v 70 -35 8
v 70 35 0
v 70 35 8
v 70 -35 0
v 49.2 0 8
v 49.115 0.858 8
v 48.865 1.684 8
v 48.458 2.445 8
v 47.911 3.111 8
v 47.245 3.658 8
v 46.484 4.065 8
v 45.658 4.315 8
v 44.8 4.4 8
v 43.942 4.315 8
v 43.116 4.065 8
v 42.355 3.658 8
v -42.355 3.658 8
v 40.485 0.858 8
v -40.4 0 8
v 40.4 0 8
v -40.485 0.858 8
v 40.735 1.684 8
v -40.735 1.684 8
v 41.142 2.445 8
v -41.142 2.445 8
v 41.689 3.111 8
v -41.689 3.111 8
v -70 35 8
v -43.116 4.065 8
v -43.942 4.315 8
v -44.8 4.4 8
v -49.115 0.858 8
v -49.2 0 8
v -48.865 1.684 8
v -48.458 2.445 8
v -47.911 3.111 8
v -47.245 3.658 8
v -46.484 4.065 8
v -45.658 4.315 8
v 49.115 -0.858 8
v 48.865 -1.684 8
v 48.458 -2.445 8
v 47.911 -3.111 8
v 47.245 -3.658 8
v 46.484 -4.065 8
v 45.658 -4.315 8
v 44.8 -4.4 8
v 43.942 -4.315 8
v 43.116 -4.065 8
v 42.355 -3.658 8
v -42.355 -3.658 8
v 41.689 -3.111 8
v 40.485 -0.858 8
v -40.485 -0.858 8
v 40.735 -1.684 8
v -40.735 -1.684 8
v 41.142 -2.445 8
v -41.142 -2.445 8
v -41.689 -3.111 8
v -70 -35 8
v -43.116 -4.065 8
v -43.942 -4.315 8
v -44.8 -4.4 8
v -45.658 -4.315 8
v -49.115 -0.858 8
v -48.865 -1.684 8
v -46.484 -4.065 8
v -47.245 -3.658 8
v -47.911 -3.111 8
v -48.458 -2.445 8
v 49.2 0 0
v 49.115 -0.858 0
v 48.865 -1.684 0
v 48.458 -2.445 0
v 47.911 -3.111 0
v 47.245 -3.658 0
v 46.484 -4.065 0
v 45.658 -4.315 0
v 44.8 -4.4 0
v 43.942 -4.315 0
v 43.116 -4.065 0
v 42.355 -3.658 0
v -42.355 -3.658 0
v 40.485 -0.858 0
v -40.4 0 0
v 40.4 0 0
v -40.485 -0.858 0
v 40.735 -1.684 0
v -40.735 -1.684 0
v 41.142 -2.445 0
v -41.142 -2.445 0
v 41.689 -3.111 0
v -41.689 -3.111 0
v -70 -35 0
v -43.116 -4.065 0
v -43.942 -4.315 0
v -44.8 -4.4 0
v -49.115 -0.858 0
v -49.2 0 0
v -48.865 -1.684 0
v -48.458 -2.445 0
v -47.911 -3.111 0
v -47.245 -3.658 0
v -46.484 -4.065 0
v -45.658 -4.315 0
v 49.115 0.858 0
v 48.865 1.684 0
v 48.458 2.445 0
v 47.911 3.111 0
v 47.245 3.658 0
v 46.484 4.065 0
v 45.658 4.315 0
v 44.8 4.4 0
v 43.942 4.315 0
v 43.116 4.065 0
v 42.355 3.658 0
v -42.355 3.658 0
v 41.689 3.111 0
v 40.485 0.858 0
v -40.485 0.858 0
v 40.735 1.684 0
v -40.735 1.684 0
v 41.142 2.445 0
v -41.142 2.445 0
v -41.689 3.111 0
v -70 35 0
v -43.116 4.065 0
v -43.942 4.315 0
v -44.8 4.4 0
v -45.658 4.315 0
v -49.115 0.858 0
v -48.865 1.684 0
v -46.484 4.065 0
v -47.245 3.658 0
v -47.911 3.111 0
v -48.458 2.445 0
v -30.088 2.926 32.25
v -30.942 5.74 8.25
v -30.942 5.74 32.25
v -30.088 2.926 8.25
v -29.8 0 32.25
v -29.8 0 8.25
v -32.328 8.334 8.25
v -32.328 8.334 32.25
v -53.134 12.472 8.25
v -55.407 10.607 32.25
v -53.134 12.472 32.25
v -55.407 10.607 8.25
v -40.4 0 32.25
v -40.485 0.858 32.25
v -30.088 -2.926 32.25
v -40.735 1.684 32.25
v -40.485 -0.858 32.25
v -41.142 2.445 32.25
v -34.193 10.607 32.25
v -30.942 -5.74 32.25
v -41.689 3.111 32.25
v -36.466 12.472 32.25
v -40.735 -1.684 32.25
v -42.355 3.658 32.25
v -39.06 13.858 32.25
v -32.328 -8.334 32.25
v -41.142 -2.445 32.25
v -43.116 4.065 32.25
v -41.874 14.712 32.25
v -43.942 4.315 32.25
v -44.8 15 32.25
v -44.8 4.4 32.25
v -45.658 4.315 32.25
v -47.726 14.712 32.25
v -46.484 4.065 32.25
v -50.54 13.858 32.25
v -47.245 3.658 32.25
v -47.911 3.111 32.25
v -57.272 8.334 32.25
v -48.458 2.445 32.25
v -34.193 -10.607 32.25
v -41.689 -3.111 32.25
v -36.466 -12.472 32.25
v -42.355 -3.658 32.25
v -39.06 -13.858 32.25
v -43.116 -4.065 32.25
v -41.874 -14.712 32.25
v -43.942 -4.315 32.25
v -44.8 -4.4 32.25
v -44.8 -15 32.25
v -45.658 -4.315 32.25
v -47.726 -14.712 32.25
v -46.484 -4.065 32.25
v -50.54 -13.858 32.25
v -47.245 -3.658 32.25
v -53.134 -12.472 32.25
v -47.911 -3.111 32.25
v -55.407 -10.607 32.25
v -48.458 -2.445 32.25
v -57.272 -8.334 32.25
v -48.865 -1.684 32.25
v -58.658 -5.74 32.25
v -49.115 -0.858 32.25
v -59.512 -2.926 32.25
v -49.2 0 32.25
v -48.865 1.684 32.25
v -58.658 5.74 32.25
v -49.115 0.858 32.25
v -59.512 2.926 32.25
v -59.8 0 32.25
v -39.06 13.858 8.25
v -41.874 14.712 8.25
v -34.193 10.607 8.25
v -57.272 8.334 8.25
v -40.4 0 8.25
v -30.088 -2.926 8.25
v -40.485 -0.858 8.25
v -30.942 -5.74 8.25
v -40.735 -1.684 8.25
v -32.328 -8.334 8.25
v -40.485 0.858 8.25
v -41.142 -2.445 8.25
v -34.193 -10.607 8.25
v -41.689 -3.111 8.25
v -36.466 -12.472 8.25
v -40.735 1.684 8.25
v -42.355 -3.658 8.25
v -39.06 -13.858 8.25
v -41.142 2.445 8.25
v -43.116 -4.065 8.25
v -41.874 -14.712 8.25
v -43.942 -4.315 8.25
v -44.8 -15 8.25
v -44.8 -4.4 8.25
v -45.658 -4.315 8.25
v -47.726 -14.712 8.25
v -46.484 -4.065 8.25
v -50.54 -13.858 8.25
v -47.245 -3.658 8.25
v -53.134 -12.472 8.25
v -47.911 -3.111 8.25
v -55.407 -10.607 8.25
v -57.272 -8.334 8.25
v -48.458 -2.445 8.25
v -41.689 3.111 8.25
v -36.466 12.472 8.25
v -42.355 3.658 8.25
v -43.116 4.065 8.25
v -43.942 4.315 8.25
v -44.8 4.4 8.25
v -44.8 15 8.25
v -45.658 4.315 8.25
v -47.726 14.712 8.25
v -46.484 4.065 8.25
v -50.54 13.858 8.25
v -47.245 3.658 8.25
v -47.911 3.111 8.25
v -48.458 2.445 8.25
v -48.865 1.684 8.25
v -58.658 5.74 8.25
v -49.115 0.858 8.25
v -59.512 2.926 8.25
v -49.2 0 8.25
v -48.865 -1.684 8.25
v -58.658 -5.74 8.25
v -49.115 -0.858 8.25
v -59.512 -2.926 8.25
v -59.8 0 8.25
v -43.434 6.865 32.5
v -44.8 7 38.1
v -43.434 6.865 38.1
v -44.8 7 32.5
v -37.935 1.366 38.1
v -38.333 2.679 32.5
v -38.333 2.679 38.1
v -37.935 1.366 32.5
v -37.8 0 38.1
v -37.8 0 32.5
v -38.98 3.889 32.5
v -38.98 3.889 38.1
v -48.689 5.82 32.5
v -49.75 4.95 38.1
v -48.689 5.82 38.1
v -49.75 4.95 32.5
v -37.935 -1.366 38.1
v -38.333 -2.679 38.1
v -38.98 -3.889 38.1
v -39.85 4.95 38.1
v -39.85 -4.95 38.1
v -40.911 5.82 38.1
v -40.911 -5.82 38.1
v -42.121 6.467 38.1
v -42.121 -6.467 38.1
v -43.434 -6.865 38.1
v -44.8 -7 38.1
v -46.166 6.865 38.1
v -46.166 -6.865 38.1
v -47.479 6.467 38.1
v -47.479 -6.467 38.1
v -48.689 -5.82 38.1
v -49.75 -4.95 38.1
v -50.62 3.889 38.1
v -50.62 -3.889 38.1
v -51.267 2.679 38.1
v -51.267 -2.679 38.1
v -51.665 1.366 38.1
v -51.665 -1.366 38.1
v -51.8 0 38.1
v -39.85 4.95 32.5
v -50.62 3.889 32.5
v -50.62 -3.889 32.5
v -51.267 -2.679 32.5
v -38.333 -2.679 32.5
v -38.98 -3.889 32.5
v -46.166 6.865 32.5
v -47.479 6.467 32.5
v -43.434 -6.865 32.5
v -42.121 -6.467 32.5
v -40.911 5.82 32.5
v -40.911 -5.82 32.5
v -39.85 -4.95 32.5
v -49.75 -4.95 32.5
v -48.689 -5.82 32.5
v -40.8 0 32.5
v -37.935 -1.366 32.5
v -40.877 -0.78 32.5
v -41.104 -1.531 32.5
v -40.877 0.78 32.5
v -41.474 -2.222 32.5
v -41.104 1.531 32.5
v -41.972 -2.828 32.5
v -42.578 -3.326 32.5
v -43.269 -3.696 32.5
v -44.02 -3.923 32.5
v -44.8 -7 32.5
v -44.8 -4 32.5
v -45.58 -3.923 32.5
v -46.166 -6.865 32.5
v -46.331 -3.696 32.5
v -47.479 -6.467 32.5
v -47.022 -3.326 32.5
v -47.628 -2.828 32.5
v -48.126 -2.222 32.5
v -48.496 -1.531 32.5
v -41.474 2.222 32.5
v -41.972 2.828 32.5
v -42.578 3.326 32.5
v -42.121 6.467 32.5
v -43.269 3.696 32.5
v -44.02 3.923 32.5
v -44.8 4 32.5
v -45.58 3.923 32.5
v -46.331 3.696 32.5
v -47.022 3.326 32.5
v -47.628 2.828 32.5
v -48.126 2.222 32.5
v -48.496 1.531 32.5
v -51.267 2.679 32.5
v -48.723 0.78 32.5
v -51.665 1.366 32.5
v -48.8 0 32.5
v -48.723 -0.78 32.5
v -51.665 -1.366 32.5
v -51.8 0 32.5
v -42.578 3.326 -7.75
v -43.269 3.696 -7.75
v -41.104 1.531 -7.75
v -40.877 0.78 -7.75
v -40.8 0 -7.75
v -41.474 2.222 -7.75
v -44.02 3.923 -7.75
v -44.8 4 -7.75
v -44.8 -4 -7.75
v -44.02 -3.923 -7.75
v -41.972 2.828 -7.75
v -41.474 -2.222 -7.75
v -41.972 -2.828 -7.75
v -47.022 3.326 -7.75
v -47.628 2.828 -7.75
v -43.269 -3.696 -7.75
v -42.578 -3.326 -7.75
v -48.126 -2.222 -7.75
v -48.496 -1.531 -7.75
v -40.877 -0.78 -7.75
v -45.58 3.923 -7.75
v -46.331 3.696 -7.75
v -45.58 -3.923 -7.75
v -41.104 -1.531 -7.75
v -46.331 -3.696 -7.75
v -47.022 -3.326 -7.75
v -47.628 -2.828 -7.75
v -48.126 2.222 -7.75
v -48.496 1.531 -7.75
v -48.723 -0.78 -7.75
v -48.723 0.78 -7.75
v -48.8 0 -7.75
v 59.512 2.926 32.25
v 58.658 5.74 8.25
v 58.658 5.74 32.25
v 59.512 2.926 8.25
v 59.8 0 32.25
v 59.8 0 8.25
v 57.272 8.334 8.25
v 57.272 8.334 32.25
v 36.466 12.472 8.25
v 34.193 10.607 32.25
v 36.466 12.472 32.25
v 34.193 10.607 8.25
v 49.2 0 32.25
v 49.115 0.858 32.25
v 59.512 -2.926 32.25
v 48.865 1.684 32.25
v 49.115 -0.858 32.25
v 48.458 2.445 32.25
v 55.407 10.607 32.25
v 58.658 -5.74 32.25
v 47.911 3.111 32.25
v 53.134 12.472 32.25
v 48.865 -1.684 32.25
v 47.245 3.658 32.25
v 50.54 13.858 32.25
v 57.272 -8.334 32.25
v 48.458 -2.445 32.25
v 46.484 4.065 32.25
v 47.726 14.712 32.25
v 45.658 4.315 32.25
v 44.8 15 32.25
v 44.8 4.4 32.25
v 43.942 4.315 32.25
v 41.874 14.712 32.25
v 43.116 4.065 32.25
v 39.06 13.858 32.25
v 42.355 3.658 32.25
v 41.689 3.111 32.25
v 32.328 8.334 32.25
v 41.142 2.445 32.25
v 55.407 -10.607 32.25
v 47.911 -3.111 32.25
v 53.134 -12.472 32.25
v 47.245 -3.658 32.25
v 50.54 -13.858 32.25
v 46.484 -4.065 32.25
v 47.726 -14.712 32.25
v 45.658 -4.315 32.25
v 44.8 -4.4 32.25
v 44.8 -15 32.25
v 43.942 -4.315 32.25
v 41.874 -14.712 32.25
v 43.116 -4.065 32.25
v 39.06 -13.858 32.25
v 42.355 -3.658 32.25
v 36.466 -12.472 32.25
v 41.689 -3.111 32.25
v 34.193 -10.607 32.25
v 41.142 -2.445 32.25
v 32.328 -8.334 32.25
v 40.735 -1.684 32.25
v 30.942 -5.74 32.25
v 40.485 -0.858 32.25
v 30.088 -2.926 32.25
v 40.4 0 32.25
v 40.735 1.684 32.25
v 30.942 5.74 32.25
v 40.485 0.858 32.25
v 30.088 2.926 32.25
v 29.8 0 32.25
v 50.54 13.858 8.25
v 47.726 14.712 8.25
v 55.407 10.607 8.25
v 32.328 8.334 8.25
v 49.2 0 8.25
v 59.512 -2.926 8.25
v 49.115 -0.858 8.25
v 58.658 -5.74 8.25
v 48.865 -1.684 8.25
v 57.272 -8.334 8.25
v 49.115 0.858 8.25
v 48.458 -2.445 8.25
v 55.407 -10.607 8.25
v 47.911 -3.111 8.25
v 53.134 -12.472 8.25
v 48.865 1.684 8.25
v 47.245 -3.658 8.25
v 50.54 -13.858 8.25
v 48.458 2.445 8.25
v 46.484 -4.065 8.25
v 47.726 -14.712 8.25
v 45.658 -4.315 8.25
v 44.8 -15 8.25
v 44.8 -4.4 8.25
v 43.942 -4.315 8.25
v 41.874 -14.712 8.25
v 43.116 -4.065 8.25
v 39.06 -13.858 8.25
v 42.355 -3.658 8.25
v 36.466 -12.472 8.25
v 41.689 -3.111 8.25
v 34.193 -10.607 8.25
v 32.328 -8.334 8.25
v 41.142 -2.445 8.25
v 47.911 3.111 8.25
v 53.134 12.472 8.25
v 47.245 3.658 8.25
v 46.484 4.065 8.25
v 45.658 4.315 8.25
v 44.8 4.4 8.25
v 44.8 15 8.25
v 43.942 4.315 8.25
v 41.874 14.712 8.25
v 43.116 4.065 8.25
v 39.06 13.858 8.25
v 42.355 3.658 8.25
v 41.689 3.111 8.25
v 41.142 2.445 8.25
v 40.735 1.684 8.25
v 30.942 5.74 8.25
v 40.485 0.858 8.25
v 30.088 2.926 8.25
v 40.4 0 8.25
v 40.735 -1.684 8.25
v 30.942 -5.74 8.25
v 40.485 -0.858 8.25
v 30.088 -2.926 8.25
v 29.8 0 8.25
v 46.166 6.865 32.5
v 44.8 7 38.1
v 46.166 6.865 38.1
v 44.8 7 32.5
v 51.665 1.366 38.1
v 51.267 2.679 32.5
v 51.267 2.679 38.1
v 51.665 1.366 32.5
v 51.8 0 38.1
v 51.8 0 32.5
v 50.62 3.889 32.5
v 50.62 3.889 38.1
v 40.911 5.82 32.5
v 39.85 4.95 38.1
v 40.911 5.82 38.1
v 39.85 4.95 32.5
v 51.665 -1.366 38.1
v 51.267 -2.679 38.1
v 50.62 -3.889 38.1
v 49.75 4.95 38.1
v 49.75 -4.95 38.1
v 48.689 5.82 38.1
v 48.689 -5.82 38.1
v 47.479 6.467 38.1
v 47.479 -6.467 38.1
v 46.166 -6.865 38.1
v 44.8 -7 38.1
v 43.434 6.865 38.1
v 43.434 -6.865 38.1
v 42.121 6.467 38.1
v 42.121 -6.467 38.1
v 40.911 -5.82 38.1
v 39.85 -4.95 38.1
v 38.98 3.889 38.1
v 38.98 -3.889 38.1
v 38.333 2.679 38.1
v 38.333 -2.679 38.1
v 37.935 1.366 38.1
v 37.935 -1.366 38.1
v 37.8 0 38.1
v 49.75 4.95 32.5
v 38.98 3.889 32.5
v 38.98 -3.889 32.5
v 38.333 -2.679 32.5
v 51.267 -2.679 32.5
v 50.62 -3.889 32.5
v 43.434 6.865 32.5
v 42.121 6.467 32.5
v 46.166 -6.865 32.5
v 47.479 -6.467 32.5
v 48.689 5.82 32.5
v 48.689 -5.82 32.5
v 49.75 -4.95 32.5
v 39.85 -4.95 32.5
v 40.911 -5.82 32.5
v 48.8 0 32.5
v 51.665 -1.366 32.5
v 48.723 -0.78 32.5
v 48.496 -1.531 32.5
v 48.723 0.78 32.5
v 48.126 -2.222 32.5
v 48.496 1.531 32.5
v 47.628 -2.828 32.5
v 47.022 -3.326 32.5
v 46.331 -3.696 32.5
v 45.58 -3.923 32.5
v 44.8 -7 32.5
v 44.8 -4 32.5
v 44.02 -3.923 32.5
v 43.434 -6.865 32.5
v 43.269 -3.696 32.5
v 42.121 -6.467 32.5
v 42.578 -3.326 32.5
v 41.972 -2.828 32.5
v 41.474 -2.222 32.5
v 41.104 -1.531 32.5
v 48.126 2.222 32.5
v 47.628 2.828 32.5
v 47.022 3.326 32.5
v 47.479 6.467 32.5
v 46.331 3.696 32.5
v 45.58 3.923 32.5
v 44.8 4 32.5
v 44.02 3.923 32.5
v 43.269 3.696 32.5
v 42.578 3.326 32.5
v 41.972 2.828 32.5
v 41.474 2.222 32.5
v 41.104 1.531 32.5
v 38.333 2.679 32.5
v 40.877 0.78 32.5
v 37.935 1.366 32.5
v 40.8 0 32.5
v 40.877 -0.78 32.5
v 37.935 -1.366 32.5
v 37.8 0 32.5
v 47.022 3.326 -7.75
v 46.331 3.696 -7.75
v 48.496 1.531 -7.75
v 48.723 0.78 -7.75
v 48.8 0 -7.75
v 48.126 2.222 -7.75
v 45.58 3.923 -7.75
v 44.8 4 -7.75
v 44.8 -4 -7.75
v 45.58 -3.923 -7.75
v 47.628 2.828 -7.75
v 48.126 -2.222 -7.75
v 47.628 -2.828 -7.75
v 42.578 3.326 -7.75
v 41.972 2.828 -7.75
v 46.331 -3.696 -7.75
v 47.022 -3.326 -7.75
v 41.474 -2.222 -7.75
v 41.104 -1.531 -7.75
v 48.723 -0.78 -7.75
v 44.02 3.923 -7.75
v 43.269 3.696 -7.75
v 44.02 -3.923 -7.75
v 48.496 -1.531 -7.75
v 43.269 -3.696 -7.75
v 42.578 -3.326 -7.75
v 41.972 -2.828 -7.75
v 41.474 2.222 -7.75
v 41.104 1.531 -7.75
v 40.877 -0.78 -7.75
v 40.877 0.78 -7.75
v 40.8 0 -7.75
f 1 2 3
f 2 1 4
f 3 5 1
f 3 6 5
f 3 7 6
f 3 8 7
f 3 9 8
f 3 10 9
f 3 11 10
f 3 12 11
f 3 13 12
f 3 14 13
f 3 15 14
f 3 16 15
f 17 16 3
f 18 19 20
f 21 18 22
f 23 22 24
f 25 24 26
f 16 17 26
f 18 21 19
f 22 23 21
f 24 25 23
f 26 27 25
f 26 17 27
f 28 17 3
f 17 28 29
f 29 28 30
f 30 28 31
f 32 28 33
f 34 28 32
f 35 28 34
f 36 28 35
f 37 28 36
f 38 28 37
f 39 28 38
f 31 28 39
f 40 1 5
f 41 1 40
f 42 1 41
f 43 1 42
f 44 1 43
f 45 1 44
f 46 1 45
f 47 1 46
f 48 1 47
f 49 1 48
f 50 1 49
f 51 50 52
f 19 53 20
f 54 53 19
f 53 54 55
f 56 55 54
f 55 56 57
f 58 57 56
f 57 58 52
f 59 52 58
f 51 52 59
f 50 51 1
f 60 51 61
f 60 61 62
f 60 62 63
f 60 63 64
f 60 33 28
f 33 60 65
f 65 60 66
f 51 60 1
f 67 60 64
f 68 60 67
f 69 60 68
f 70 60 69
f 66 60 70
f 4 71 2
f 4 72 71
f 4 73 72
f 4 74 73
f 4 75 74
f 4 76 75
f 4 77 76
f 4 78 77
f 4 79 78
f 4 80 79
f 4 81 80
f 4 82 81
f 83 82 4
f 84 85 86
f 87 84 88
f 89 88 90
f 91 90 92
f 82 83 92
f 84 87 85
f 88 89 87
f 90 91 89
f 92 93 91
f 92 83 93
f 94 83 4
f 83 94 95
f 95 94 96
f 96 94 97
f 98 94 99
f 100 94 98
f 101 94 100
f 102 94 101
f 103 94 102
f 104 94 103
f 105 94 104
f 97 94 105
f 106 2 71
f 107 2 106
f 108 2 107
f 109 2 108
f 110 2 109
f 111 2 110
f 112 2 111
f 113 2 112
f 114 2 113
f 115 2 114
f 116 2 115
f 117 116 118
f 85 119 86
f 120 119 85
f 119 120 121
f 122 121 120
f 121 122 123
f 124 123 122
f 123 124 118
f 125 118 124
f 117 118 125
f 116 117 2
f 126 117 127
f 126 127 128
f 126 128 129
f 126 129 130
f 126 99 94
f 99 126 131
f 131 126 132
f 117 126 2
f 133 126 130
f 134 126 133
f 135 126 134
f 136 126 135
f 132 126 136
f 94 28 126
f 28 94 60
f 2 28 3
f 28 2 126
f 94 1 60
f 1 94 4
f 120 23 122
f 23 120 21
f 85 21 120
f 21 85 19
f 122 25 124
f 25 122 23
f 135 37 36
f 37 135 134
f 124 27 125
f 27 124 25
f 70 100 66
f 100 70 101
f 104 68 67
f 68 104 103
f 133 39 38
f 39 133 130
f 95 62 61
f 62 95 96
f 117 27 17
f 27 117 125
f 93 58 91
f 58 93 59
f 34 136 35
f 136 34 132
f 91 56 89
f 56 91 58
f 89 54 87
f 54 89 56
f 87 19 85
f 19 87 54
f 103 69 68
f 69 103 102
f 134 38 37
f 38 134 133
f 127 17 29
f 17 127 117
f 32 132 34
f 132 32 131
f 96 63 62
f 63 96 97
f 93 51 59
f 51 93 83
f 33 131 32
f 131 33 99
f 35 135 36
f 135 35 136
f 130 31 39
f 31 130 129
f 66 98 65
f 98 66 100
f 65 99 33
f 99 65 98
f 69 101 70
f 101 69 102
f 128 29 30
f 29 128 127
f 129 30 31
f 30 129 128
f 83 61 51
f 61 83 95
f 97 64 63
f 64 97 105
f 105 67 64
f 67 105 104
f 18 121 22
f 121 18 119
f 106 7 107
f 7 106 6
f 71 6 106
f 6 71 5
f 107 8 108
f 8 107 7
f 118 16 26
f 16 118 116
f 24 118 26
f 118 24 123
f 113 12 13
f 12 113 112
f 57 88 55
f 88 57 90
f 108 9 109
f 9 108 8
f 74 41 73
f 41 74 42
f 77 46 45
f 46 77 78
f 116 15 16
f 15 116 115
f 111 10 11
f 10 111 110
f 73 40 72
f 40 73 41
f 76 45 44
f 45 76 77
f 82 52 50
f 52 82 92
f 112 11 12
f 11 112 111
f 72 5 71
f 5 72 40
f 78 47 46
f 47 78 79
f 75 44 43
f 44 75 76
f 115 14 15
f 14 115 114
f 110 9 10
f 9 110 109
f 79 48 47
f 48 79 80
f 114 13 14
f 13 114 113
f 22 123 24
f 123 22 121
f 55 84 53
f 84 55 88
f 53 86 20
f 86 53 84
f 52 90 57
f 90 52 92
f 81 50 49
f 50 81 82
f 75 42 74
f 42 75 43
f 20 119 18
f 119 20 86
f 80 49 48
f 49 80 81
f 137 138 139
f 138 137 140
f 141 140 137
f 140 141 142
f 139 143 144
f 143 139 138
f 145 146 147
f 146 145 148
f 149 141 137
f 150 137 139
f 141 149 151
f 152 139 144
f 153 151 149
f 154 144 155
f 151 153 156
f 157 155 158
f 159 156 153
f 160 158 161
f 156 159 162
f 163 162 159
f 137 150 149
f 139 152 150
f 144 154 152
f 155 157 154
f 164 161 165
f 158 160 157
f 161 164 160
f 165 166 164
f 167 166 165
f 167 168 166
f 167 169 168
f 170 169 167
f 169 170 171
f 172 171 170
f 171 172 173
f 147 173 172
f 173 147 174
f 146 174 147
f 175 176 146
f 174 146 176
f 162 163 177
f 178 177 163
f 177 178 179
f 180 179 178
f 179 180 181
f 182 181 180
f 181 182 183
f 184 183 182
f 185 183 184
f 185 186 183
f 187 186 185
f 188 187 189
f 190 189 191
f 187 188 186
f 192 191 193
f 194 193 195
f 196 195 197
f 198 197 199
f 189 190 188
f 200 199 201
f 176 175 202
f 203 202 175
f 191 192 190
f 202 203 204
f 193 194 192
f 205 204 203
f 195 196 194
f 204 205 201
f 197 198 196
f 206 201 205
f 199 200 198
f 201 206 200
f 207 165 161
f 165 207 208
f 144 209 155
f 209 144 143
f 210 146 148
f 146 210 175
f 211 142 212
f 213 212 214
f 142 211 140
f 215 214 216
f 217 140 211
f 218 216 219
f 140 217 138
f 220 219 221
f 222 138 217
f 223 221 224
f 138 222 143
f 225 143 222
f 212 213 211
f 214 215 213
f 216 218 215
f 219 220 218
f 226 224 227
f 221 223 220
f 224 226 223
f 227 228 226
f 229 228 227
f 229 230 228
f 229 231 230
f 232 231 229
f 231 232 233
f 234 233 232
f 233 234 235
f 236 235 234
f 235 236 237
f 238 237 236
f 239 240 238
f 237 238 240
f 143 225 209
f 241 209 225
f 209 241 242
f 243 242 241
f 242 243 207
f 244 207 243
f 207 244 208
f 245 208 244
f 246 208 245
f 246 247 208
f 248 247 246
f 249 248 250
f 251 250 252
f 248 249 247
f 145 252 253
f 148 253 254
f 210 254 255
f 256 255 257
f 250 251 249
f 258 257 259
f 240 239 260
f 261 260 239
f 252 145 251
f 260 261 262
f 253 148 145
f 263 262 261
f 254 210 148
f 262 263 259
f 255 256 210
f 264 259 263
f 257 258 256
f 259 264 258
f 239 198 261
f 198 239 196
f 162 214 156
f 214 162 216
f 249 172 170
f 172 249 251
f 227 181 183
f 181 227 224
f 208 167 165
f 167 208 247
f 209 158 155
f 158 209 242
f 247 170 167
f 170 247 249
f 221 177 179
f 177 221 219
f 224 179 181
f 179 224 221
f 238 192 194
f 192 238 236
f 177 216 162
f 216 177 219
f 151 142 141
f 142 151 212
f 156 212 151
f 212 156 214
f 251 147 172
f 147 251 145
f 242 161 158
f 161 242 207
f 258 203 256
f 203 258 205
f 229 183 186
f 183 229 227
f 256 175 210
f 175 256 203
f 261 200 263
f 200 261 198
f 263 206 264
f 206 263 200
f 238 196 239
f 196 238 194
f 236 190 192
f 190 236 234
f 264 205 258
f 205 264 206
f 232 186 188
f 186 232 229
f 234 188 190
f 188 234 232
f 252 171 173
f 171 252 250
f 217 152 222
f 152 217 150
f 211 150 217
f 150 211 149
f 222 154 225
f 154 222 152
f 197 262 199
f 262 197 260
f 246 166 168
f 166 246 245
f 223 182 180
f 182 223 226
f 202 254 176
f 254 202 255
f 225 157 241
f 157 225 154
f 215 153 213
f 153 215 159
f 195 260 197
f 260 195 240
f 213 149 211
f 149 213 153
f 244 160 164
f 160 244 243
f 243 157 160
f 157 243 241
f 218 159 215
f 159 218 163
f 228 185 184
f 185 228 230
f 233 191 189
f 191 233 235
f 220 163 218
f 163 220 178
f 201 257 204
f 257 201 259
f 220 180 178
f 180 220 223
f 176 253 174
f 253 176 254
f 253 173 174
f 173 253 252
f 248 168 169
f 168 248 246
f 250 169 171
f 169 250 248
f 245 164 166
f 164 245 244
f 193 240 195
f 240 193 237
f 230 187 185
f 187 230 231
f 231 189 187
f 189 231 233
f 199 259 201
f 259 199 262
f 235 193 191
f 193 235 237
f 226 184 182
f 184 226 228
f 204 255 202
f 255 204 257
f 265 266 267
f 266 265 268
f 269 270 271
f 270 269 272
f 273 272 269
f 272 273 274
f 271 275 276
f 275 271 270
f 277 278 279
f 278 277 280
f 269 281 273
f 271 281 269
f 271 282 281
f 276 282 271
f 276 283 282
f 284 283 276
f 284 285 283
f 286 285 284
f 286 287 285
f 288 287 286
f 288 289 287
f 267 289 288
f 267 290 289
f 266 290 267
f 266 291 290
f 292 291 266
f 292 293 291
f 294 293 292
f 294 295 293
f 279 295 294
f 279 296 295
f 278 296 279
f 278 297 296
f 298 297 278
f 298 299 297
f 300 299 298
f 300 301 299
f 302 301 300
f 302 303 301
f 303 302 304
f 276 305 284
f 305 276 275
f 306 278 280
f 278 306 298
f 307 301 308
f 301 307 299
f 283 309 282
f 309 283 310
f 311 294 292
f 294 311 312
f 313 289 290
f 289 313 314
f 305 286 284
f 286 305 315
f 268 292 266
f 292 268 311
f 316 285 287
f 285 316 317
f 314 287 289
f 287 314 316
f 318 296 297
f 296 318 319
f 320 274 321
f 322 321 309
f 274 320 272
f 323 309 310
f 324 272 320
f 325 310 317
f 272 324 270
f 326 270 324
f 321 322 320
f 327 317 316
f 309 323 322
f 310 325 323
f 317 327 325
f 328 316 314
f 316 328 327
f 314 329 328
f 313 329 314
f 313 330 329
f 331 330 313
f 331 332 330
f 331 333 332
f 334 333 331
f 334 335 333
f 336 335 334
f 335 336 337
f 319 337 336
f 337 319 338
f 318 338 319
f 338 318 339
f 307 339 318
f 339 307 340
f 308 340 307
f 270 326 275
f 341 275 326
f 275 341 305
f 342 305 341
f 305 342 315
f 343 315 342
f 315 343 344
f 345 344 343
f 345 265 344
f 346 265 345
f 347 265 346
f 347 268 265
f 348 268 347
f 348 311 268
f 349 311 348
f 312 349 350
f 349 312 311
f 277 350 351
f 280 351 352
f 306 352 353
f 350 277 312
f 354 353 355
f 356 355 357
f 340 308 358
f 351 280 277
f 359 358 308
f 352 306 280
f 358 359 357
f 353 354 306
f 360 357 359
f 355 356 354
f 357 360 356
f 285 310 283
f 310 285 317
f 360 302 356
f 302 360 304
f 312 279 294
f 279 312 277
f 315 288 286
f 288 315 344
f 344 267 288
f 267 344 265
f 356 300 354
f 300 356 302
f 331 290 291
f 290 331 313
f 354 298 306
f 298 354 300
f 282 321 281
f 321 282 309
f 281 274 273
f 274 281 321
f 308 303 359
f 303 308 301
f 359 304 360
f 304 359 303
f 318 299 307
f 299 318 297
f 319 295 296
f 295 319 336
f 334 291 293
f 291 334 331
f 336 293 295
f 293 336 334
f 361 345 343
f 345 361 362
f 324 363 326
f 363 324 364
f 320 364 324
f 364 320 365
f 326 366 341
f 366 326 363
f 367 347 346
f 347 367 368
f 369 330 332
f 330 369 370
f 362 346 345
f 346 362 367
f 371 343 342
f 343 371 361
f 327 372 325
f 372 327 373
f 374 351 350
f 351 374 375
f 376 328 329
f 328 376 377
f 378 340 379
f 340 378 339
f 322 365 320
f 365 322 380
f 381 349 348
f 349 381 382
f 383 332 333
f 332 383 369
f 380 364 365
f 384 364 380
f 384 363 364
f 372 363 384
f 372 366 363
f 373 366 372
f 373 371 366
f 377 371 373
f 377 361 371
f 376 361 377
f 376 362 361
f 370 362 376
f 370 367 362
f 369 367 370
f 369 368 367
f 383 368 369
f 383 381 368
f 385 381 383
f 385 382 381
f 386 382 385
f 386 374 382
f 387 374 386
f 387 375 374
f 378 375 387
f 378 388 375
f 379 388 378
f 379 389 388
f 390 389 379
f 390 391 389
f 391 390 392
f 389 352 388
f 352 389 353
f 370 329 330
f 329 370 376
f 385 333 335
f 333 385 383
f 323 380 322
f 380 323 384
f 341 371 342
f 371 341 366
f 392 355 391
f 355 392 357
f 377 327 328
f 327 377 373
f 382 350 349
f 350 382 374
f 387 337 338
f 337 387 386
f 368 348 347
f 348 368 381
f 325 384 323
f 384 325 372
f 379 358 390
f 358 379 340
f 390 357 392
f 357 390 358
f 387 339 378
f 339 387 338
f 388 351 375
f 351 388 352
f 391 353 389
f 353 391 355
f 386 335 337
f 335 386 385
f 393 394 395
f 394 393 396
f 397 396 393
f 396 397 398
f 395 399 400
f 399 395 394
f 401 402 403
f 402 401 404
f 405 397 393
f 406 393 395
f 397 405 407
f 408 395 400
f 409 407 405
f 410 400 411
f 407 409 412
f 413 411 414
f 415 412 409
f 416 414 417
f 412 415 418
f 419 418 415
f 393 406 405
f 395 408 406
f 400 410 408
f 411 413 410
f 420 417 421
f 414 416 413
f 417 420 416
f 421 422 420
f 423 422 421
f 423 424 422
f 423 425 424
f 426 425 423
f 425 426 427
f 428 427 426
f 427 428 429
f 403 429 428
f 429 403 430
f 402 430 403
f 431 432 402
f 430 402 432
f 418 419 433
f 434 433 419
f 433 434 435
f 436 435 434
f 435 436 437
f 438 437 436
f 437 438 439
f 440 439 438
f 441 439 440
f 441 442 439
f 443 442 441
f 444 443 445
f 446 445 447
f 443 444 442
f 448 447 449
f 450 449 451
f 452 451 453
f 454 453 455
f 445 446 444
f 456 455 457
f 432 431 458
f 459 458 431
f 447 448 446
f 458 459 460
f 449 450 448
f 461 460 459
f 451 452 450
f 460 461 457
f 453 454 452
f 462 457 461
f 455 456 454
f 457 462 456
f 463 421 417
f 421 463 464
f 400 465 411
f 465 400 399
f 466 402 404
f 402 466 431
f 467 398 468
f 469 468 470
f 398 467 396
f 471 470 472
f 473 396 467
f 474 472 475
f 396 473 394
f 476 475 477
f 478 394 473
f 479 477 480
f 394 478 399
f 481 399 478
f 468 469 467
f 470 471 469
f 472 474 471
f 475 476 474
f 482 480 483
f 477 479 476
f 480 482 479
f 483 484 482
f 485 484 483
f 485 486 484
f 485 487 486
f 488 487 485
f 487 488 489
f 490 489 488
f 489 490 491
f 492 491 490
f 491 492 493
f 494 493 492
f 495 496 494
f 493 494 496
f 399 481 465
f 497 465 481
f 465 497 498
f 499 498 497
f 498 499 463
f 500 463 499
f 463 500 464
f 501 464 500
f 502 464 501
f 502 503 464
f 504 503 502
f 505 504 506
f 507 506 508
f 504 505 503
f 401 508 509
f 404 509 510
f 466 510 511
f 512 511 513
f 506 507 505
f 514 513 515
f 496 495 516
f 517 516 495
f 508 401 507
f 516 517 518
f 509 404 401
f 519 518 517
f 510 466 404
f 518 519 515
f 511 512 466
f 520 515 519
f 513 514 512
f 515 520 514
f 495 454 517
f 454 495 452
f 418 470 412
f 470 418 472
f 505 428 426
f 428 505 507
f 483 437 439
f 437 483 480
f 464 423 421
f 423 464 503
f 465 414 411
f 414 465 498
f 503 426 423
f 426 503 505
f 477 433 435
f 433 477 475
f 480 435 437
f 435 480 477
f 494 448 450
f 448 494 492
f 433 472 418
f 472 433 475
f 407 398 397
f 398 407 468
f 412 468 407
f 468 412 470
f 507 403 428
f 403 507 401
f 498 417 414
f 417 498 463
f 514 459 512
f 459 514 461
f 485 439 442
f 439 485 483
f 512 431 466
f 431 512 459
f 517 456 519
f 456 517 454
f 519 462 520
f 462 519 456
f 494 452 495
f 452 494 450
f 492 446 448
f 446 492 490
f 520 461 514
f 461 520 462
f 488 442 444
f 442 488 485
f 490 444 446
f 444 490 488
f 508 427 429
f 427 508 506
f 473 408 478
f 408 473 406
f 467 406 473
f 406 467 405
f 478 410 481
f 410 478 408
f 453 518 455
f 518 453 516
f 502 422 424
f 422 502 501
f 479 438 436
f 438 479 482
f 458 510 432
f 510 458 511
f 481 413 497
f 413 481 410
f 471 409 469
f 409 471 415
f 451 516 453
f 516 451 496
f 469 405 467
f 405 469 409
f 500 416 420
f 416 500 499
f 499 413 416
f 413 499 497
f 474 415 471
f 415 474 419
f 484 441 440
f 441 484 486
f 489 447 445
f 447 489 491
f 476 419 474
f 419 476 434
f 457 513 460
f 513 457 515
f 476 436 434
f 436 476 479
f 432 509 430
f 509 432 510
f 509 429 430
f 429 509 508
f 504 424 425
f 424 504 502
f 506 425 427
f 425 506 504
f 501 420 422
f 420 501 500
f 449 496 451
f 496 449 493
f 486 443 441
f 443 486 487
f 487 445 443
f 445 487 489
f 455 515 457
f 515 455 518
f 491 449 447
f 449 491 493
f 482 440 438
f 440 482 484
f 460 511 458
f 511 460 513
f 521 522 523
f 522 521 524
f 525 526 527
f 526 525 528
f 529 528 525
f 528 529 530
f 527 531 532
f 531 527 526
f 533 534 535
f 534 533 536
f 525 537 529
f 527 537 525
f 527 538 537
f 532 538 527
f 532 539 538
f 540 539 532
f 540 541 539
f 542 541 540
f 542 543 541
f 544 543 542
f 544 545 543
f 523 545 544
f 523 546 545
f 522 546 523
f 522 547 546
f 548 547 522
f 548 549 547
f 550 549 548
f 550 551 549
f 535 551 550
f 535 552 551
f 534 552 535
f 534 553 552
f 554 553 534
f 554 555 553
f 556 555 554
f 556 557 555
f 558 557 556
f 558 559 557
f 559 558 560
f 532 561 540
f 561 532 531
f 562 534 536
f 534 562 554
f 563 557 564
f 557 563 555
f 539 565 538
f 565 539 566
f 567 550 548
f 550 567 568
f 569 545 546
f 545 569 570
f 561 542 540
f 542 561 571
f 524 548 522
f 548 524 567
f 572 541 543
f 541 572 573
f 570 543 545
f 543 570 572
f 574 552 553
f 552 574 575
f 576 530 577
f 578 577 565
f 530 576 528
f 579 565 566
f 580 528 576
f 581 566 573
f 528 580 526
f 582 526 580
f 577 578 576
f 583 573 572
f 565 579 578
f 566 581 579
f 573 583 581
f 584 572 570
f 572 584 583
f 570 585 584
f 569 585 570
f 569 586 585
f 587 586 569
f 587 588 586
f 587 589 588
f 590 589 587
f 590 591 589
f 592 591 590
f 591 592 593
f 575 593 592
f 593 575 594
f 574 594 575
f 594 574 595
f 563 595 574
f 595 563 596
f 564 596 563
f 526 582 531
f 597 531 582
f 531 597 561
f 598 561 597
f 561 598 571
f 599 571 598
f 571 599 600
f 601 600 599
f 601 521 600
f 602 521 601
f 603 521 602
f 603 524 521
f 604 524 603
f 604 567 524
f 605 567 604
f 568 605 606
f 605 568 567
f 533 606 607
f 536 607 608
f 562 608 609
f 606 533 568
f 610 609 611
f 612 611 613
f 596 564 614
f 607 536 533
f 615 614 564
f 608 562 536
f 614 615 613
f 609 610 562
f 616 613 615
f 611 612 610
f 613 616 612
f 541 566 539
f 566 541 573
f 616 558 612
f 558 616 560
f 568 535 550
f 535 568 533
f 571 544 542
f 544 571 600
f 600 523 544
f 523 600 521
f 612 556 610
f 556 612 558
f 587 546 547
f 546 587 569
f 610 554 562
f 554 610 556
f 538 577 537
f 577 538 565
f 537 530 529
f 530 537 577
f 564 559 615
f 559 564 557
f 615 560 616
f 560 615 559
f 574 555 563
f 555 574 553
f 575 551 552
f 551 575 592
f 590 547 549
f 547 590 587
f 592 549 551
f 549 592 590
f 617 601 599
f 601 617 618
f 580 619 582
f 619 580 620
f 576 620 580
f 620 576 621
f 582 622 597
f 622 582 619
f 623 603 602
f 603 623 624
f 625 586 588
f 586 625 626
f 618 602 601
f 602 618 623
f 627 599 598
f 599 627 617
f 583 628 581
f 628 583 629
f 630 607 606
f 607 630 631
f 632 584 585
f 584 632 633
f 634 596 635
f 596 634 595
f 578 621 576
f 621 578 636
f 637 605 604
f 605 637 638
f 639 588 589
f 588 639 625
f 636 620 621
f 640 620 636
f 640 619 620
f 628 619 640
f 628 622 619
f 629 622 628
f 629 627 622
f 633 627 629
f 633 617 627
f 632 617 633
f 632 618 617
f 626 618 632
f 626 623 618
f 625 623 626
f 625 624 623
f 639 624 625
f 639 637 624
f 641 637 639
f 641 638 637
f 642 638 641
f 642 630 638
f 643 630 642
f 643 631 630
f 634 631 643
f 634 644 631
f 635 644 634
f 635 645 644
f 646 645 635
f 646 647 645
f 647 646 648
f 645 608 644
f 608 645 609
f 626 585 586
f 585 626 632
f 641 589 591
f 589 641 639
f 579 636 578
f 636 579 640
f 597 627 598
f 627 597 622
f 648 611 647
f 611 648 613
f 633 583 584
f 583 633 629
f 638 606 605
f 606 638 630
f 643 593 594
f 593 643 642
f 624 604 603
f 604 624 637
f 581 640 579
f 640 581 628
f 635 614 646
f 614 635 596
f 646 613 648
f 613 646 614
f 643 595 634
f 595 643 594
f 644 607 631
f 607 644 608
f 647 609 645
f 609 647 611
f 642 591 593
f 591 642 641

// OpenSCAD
$fn = 32;

// ------------------------------------------------------------------------
// Standoff columns: 2 d30 standoffs, bolts d8
// Every part is its own module, assembly() places them once.
// ------------------------------------------------------------------------

// --- part 1 ---
module base_plate() {
  difference() {
    translate([-70, -35, 0]) cube([140, 70, 8]);
    translate([-44.8, 0, -1]) cylinder(h = 10, d = 8.8);
    translate([44.8, 0, -1]) cylinder(h = 10, d = 8.8);
  }
}

// --- part 2 ---
module spacer1() {
  difference() {
      translate([0, 0, 0]) cylinder(h = 24, d = 30);
      translate([0, 0, -1]) cylinder(h = 26, d = 8.8);
    }
}

// --- part 3 ---
module bolt1() {
  cylinder(h = 5.6, d = 14);
  translate([0, 0, -40.25]) cylinder(h = 40.25, d = 8);
}

// --- part 4 ---
module spacer2() {
  difference() {
      translate([0, 0, 0]) cylinder(h = 24, d = 30);
      translate([0, 0, -1]) cylinder(h = 26, d = 8.8);
    }
}

// --- part 5 ---
module bolt2() {
  cylinder(h = 5.6, d = 14);
  translate([0, 0, -40.25]) cylinder(h = 40.25, d = 8);
}

// --- assembly ---
module assembly() {
  translate([0, 0, 0]) rotate([0, 0, 0]) base_plate();
  translate([-44.8, 0, 8.25]) rotate([0, 0, 0]) spacer1();
  translate([-44.8, 0, 32.5]) rotate([0, 0, 0]) bolt1();
  translate([44.8, 0, 8.25]) rotate([0, 0, 0]) spacer2();
  translate([44.8, 0, 32.5]) rotate([0, 0, 0]) bolt2();
}

assembly();
